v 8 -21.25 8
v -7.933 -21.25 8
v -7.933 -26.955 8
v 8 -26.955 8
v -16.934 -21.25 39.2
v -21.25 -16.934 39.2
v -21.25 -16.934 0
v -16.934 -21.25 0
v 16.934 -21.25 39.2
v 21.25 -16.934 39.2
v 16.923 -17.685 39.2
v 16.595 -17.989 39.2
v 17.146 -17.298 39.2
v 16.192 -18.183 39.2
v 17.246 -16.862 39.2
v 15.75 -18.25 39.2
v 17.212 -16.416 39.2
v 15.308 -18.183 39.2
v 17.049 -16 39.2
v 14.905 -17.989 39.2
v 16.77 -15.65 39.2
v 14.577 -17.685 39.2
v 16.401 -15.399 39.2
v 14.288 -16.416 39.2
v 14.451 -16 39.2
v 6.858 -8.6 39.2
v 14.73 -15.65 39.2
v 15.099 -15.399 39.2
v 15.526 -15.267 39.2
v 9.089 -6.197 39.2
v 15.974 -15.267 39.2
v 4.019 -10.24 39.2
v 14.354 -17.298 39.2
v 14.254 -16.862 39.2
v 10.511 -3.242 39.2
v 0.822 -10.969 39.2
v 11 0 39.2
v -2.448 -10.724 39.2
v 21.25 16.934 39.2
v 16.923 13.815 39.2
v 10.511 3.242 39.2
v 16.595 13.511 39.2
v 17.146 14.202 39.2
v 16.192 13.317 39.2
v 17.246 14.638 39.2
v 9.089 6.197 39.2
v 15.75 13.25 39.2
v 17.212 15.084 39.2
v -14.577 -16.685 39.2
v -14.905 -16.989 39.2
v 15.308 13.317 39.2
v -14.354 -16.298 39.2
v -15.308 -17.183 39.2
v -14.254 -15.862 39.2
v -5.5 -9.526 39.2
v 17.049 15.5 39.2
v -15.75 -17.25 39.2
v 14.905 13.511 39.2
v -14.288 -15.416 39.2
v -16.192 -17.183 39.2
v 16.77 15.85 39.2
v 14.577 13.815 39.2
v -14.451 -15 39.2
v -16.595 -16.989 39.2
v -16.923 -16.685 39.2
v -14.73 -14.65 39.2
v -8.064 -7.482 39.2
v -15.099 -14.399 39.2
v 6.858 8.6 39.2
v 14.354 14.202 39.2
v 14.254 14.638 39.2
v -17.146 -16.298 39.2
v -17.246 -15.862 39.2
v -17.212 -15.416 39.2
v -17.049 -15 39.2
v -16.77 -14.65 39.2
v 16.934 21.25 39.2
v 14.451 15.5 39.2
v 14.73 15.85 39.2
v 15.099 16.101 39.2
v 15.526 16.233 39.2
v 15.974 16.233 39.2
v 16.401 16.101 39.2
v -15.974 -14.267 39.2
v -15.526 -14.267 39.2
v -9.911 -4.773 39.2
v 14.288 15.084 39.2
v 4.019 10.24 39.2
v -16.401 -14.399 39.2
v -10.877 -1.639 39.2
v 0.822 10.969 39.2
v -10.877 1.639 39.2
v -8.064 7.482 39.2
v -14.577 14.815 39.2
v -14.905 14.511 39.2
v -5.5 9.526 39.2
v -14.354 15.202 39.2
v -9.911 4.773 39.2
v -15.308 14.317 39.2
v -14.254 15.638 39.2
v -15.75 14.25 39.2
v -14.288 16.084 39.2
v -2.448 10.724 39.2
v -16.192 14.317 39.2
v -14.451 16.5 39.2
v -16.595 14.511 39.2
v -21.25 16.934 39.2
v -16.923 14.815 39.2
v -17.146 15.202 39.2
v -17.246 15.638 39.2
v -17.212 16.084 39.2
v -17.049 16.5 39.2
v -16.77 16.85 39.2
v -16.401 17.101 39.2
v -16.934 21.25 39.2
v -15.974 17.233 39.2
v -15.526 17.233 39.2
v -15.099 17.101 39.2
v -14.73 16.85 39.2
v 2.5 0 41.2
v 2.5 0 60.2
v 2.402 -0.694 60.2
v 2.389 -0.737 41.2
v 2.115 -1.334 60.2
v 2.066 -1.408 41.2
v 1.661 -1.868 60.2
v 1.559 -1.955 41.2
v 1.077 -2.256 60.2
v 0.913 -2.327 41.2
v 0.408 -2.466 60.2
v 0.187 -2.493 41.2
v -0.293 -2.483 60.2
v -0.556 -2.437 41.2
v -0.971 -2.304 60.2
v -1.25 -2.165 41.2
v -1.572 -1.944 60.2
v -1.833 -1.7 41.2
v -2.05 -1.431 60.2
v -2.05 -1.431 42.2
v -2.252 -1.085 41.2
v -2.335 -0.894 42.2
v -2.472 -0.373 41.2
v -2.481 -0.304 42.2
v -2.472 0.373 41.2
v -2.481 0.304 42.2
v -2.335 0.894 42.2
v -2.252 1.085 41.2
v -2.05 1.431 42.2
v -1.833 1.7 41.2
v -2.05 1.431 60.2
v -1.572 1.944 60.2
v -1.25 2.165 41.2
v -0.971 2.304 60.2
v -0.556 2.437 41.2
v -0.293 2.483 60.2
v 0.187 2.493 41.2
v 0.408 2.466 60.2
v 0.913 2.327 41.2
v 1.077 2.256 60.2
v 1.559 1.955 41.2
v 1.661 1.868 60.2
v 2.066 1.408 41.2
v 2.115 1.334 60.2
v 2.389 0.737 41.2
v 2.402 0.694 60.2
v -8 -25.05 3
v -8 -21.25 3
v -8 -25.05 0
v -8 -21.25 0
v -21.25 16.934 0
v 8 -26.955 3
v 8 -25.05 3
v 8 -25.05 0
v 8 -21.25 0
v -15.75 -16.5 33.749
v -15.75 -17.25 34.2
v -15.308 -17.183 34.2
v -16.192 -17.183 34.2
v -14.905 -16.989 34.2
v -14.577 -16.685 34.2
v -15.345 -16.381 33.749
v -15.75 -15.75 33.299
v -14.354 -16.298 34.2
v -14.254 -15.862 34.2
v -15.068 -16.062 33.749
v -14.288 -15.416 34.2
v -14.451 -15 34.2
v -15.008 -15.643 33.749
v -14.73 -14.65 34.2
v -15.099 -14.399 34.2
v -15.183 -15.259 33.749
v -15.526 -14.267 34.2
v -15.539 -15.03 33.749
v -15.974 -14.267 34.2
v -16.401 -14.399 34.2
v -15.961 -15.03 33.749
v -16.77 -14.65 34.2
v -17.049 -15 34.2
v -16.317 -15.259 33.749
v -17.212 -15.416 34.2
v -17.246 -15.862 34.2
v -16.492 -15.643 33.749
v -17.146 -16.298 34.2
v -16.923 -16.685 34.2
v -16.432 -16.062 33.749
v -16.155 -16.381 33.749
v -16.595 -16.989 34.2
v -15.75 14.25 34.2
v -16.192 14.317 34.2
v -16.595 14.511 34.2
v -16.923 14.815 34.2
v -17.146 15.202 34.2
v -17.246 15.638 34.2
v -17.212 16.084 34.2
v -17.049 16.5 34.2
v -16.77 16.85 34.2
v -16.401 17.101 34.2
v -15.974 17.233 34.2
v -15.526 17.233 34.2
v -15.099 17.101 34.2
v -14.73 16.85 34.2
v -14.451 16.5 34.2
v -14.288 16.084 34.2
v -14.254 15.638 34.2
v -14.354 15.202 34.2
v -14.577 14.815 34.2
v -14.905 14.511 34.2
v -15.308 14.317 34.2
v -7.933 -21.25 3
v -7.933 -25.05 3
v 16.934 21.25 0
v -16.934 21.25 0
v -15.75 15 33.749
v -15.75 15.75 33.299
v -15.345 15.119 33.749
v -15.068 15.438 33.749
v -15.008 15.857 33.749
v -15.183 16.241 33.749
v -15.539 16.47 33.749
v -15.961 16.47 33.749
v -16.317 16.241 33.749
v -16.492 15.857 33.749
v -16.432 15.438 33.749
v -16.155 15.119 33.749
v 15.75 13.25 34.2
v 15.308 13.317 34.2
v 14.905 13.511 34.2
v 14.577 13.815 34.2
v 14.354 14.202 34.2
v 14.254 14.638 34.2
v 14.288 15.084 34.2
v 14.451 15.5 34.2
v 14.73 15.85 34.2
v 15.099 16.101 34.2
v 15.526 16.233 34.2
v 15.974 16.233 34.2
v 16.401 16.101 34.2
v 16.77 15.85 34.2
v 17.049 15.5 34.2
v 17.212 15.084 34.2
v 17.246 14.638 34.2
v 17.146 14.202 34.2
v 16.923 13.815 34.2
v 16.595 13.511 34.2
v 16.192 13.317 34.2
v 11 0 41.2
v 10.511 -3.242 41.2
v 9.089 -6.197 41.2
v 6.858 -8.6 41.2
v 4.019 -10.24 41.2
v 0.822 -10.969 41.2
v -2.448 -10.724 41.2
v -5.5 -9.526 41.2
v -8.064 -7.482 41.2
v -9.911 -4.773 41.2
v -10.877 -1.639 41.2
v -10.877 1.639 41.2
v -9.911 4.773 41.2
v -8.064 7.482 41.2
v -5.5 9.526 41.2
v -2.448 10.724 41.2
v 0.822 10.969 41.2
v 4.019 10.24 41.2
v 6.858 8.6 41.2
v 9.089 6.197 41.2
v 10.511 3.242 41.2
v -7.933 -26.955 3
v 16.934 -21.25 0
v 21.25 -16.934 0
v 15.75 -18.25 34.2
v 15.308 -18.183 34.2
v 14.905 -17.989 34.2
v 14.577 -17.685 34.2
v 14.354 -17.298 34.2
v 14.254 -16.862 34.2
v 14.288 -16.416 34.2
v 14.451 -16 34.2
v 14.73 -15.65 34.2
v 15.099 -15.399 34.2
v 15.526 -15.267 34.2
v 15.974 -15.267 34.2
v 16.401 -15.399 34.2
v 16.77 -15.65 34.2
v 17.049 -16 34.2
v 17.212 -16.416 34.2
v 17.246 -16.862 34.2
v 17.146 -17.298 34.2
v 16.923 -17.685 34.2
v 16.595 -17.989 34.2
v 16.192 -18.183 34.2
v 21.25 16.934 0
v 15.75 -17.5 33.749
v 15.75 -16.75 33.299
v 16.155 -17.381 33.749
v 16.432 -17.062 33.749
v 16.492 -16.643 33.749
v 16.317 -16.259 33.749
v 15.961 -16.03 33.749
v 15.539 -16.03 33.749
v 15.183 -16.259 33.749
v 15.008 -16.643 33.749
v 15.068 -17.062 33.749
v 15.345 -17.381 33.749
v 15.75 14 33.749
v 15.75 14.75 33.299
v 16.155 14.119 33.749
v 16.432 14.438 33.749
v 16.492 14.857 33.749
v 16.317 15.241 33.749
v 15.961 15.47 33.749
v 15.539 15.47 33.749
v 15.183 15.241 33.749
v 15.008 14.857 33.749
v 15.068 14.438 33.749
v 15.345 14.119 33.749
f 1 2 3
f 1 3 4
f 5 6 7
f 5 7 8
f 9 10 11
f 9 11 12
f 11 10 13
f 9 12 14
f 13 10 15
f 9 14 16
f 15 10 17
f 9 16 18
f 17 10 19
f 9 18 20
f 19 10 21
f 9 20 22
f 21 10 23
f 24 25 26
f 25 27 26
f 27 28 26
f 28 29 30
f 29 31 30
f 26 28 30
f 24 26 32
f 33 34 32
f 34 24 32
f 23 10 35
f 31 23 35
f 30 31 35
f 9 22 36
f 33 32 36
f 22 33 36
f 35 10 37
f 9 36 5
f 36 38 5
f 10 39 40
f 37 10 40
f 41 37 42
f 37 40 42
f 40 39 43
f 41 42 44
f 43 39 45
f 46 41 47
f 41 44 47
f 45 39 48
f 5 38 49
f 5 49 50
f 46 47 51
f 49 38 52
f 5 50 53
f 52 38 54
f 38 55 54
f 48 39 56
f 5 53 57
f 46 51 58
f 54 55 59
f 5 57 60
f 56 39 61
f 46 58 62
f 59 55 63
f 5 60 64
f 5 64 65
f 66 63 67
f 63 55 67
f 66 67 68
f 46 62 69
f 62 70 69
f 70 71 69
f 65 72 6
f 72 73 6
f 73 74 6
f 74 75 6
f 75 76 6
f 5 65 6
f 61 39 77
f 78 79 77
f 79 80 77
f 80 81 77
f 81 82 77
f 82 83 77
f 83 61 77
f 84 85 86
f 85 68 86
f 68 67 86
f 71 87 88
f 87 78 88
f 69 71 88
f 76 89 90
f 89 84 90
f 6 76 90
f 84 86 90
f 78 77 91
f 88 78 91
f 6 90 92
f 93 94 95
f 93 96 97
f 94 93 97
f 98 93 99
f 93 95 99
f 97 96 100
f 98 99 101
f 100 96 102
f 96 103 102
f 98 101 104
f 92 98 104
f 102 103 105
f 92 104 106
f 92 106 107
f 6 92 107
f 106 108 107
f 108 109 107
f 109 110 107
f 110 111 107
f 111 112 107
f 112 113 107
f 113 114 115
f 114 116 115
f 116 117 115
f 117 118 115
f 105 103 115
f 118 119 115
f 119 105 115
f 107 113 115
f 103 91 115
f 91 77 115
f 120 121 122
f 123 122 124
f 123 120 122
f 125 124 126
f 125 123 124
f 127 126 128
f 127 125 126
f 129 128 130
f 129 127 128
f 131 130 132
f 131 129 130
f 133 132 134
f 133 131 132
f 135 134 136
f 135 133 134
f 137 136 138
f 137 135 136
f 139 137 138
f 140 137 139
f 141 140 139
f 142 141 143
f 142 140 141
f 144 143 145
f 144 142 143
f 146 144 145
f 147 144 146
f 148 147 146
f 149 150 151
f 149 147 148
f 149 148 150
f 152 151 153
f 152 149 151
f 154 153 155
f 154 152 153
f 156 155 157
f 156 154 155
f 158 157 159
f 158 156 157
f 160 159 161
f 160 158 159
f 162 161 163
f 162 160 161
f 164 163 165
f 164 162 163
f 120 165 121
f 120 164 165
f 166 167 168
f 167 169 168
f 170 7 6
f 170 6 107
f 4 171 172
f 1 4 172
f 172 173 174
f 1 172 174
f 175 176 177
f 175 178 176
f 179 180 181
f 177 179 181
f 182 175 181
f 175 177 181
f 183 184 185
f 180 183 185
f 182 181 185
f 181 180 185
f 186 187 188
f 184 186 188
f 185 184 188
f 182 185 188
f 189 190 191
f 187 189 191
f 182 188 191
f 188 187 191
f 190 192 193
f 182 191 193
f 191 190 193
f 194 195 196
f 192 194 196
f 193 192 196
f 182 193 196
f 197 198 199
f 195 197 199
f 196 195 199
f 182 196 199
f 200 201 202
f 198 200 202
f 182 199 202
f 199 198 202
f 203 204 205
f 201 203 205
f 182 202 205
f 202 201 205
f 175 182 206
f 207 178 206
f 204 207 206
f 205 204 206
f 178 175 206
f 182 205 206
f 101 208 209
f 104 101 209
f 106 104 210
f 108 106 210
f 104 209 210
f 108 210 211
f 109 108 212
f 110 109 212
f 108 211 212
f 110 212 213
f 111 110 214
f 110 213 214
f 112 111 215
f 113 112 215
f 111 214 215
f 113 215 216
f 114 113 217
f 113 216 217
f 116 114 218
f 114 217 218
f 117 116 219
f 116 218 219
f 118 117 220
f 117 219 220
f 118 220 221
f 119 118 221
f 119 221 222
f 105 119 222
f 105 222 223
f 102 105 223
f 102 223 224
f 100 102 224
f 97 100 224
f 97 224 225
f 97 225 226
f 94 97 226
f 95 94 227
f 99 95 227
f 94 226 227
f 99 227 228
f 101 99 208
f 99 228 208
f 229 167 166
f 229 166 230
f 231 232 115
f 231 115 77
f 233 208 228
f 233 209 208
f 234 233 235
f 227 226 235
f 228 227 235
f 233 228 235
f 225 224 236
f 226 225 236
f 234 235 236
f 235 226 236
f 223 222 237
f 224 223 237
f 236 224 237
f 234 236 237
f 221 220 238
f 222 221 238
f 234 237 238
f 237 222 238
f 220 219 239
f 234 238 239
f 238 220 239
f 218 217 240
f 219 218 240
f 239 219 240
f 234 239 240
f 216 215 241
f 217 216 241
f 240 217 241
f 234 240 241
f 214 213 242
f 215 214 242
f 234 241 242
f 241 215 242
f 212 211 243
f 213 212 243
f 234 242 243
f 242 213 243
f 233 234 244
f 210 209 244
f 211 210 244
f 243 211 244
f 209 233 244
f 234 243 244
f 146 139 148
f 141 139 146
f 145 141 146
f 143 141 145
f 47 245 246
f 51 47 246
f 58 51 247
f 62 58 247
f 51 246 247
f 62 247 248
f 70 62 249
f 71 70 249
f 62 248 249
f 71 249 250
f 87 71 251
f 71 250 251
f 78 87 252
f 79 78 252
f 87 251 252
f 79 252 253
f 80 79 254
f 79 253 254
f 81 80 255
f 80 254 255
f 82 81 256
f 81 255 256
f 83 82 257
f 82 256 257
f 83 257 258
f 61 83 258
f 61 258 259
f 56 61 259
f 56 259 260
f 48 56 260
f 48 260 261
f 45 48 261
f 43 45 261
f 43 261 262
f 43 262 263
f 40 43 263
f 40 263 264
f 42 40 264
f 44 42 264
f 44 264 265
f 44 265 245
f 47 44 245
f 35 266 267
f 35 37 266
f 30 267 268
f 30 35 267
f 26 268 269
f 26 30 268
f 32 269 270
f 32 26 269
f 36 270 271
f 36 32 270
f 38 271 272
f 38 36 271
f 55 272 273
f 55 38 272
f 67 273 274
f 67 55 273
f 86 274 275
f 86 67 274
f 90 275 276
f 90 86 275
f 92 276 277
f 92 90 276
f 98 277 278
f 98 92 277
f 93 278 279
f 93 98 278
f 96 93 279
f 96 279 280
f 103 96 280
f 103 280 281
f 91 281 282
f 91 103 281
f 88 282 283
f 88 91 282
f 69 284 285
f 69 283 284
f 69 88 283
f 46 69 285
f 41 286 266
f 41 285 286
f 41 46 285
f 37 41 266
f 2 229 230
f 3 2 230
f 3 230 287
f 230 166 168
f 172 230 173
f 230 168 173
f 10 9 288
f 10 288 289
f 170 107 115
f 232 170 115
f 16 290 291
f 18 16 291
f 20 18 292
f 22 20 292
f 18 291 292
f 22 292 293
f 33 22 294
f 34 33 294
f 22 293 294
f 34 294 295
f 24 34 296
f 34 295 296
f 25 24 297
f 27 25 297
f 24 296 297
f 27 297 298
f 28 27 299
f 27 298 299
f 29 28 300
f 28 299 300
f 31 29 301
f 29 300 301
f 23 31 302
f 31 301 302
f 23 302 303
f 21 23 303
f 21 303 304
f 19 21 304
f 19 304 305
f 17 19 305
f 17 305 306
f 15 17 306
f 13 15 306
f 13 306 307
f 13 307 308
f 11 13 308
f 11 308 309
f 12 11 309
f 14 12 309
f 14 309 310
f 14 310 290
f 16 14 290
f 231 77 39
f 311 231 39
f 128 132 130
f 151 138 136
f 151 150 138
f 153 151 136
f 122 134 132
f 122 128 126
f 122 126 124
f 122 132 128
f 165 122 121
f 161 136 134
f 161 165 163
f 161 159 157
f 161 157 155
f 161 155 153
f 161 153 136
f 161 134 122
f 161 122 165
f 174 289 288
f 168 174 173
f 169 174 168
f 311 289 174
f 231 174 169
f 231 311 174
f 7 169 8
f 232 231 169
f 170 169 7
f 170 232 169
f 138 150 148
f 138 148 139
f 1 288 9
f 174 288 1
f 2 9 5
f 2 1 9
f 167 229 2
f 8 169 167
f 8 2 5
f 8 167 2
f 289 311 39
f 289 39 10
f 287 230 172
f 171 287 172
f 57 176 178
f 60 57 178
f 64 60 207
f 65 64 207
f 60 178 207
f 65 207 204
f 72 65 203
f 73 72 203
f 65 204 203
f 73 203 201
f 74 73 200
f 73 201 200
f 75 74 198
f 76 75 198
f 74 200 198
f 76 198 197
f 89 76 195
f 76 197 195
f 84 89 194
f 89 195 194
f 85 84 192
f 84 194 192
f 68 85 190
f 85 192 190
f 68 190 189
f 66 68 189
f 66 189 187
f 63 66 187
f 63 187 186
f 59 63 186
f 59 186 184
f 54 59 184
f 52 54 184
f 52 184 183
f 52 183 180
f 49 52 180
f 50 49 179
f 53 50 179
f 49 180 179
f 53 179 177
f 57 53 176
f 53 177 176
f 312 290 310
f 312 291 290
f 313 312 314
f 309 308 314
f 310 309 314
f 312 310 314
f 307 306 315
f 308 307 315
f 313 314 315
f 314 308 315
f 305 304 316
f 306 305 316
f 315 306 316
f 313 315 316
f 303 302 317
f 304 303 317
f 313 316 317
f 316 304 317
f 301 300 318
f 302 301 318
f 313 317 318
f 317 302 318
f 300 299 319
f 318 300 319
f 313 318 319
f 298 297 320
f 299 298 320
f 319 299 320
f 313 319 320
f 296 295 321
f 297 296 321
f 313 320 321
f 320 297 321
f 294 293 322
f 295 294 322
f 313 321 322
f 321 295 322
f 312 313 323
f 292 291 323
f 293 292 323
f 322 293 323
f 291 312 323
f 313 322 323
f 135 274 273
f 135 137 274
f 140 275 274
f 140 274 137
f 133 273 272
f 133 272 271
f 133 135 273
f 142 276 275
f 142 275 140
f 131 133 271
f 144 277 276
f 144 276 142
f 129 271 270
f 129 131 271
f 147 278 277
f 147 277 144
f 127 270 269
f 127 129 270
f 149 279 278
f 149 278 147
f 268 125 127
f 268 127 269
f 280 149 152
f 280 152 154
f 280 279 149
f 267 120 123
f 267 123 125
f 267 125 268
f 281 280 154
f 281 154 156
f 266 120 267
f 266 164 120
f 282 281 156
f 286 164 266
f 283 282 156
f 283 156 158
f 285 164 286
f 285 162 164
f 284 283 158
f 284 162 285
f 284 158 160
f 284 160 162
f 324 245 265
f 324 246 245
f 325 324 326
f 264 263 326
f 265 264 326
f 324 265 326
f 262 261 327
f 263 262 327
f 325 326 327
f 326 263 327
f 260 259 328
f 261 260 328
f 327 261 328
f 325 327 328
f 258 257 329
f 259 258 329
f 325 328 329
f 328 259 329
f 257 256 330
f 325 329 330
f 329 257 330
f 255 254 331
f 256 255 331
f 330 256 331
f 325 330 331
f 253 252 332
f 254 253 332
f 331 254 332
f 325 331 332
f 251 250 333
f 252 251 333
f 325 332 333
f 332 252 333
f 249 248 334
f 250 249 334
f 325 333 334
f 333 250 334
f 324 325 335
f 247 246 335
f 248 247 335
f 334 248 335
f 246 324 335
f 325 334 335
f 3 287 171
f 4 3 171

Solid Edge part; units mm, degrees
sketch "Sketch1" plane through (0, 0, 0) normal (0, 0, 1) x (1, 0, 0)
  line L0 (-16.9338, 21.25) -> (16.9338, 21.25)
  line L1 (16.9338, 21.25) -> (21.25, 16.9338)
  line L2 (21.25, 16.9338) -> (21.25, -16.9338)
  line L3 (16.9338, -21.25) -> (21.25, -16.9338)
  line L4 (16.9338, -21.25) -> (-16.9338, -21.25)
  line L5 (-21.25, -16.9338) -> (-16.9338, -21.25)
  line L6 (-21.25, -16.9338) -> (-21.25, 16.9338)
  line L7 (-21.25, 16.9338) -> (-16.9338, 21.25)
  dimension "D1" = 33.8675
  dimension "D2" = 33.8675
  dimension "D3" = 21.25
  dimension "D4" = 21.25
extrude "Protrusion1" add sketch "Sketch1" along normal blind 39.2
sketch "Sketch2" plane through (0, 0, 0) normal (0, 0, 1) x (1, 0, 0)
  line L0 (0, -25.05) -> (8, -25.05)
  line L1 (8, -25.05) -> (8, -21.25)
  line L2 (8, -21.25) -> (-8, -21.25)
  line L3 (-8, -21.25) -> (-8, -25.05)
  line L4 (-8, -25.05) -> (0, -25.05)
extrude "ExtrudedProtrusion_2" add sketch "Sketch2" along normal blind 3
sketch "Sketch3" plane through (0, -23.15, 3) normal (0, 0, 1) x (1, 0, 0)
  line L0 (0, -3.8049) -> (8, -3.8049)
  line L1 (8, -3.8049) -> (8, 1.9)
  line L2 (8, 1.9) -> (-7.9332, 1.9)
  line L3 (-7.9332, 1.9) -> (-7.9332, -3.8049)
  line L4 (-7.9332, -3.8049) -> (0, -3.8049)
extrude "ExtrudedProtrusion_3" add sketch "Sketch3" along normal blind 5
sketch "Sketch4" plane through (0, 0, 39.2) normal (0, 0, 1) x (1, 0, 0)
  circle A0 centre (0, 0) radius 11
extrude "ExtrudedProtrusion_4" add sketch "Sketch4" along normal blind 2
sketch "Sketch5" plane through (0, 0, 39.2) normal (0, 0, 1) x (1, 0, 0)
  circle A0 centre (0, 0) radius 2.5
extrude "ExtrudedProtrusion_5" add sketch "Sketch5" along normal blind 21
sketch "Sketch6" plane through (0, 0, 60.2) normal (0, 0, 1) x (1, 0, 0)
  line L0 (-2.05, 2.7947) -> (-2.05, -2.6865)
  line L1 (-3.2935, -2.0855) -> (-2.05, -2.6865)
  line L2 (-4.0147, 1.8811) -> (-3.2935, -2.0855)
  line L3 (-2.05, 2.7947) -> (-4.0147, 1.8811)
  dimension "D1" = 4.55
extrude "ExtrudedCutout_1" cut sketch "Sketch6" against normal blind 18
hole "Hole_1" at (-15.75, 15.75, 39.2) direction (0, 0, -1) diameter 3 depth 5 tip angle 118
hole "Hole1" at (15.75, 14.75, 39.2) direction (0, 0, -1) diameter 3 depth 5 tip angle 118
hole "Hole2" at (15.75, -16.75, 39.2) direction (0, 0, -1) diameter 3 depth 5 tip angle 118
hole "Hole3" at (-15.75, -15.75, 39.2) direction (0, 0, -1) diameter 3 depth 5 tip angle 118
